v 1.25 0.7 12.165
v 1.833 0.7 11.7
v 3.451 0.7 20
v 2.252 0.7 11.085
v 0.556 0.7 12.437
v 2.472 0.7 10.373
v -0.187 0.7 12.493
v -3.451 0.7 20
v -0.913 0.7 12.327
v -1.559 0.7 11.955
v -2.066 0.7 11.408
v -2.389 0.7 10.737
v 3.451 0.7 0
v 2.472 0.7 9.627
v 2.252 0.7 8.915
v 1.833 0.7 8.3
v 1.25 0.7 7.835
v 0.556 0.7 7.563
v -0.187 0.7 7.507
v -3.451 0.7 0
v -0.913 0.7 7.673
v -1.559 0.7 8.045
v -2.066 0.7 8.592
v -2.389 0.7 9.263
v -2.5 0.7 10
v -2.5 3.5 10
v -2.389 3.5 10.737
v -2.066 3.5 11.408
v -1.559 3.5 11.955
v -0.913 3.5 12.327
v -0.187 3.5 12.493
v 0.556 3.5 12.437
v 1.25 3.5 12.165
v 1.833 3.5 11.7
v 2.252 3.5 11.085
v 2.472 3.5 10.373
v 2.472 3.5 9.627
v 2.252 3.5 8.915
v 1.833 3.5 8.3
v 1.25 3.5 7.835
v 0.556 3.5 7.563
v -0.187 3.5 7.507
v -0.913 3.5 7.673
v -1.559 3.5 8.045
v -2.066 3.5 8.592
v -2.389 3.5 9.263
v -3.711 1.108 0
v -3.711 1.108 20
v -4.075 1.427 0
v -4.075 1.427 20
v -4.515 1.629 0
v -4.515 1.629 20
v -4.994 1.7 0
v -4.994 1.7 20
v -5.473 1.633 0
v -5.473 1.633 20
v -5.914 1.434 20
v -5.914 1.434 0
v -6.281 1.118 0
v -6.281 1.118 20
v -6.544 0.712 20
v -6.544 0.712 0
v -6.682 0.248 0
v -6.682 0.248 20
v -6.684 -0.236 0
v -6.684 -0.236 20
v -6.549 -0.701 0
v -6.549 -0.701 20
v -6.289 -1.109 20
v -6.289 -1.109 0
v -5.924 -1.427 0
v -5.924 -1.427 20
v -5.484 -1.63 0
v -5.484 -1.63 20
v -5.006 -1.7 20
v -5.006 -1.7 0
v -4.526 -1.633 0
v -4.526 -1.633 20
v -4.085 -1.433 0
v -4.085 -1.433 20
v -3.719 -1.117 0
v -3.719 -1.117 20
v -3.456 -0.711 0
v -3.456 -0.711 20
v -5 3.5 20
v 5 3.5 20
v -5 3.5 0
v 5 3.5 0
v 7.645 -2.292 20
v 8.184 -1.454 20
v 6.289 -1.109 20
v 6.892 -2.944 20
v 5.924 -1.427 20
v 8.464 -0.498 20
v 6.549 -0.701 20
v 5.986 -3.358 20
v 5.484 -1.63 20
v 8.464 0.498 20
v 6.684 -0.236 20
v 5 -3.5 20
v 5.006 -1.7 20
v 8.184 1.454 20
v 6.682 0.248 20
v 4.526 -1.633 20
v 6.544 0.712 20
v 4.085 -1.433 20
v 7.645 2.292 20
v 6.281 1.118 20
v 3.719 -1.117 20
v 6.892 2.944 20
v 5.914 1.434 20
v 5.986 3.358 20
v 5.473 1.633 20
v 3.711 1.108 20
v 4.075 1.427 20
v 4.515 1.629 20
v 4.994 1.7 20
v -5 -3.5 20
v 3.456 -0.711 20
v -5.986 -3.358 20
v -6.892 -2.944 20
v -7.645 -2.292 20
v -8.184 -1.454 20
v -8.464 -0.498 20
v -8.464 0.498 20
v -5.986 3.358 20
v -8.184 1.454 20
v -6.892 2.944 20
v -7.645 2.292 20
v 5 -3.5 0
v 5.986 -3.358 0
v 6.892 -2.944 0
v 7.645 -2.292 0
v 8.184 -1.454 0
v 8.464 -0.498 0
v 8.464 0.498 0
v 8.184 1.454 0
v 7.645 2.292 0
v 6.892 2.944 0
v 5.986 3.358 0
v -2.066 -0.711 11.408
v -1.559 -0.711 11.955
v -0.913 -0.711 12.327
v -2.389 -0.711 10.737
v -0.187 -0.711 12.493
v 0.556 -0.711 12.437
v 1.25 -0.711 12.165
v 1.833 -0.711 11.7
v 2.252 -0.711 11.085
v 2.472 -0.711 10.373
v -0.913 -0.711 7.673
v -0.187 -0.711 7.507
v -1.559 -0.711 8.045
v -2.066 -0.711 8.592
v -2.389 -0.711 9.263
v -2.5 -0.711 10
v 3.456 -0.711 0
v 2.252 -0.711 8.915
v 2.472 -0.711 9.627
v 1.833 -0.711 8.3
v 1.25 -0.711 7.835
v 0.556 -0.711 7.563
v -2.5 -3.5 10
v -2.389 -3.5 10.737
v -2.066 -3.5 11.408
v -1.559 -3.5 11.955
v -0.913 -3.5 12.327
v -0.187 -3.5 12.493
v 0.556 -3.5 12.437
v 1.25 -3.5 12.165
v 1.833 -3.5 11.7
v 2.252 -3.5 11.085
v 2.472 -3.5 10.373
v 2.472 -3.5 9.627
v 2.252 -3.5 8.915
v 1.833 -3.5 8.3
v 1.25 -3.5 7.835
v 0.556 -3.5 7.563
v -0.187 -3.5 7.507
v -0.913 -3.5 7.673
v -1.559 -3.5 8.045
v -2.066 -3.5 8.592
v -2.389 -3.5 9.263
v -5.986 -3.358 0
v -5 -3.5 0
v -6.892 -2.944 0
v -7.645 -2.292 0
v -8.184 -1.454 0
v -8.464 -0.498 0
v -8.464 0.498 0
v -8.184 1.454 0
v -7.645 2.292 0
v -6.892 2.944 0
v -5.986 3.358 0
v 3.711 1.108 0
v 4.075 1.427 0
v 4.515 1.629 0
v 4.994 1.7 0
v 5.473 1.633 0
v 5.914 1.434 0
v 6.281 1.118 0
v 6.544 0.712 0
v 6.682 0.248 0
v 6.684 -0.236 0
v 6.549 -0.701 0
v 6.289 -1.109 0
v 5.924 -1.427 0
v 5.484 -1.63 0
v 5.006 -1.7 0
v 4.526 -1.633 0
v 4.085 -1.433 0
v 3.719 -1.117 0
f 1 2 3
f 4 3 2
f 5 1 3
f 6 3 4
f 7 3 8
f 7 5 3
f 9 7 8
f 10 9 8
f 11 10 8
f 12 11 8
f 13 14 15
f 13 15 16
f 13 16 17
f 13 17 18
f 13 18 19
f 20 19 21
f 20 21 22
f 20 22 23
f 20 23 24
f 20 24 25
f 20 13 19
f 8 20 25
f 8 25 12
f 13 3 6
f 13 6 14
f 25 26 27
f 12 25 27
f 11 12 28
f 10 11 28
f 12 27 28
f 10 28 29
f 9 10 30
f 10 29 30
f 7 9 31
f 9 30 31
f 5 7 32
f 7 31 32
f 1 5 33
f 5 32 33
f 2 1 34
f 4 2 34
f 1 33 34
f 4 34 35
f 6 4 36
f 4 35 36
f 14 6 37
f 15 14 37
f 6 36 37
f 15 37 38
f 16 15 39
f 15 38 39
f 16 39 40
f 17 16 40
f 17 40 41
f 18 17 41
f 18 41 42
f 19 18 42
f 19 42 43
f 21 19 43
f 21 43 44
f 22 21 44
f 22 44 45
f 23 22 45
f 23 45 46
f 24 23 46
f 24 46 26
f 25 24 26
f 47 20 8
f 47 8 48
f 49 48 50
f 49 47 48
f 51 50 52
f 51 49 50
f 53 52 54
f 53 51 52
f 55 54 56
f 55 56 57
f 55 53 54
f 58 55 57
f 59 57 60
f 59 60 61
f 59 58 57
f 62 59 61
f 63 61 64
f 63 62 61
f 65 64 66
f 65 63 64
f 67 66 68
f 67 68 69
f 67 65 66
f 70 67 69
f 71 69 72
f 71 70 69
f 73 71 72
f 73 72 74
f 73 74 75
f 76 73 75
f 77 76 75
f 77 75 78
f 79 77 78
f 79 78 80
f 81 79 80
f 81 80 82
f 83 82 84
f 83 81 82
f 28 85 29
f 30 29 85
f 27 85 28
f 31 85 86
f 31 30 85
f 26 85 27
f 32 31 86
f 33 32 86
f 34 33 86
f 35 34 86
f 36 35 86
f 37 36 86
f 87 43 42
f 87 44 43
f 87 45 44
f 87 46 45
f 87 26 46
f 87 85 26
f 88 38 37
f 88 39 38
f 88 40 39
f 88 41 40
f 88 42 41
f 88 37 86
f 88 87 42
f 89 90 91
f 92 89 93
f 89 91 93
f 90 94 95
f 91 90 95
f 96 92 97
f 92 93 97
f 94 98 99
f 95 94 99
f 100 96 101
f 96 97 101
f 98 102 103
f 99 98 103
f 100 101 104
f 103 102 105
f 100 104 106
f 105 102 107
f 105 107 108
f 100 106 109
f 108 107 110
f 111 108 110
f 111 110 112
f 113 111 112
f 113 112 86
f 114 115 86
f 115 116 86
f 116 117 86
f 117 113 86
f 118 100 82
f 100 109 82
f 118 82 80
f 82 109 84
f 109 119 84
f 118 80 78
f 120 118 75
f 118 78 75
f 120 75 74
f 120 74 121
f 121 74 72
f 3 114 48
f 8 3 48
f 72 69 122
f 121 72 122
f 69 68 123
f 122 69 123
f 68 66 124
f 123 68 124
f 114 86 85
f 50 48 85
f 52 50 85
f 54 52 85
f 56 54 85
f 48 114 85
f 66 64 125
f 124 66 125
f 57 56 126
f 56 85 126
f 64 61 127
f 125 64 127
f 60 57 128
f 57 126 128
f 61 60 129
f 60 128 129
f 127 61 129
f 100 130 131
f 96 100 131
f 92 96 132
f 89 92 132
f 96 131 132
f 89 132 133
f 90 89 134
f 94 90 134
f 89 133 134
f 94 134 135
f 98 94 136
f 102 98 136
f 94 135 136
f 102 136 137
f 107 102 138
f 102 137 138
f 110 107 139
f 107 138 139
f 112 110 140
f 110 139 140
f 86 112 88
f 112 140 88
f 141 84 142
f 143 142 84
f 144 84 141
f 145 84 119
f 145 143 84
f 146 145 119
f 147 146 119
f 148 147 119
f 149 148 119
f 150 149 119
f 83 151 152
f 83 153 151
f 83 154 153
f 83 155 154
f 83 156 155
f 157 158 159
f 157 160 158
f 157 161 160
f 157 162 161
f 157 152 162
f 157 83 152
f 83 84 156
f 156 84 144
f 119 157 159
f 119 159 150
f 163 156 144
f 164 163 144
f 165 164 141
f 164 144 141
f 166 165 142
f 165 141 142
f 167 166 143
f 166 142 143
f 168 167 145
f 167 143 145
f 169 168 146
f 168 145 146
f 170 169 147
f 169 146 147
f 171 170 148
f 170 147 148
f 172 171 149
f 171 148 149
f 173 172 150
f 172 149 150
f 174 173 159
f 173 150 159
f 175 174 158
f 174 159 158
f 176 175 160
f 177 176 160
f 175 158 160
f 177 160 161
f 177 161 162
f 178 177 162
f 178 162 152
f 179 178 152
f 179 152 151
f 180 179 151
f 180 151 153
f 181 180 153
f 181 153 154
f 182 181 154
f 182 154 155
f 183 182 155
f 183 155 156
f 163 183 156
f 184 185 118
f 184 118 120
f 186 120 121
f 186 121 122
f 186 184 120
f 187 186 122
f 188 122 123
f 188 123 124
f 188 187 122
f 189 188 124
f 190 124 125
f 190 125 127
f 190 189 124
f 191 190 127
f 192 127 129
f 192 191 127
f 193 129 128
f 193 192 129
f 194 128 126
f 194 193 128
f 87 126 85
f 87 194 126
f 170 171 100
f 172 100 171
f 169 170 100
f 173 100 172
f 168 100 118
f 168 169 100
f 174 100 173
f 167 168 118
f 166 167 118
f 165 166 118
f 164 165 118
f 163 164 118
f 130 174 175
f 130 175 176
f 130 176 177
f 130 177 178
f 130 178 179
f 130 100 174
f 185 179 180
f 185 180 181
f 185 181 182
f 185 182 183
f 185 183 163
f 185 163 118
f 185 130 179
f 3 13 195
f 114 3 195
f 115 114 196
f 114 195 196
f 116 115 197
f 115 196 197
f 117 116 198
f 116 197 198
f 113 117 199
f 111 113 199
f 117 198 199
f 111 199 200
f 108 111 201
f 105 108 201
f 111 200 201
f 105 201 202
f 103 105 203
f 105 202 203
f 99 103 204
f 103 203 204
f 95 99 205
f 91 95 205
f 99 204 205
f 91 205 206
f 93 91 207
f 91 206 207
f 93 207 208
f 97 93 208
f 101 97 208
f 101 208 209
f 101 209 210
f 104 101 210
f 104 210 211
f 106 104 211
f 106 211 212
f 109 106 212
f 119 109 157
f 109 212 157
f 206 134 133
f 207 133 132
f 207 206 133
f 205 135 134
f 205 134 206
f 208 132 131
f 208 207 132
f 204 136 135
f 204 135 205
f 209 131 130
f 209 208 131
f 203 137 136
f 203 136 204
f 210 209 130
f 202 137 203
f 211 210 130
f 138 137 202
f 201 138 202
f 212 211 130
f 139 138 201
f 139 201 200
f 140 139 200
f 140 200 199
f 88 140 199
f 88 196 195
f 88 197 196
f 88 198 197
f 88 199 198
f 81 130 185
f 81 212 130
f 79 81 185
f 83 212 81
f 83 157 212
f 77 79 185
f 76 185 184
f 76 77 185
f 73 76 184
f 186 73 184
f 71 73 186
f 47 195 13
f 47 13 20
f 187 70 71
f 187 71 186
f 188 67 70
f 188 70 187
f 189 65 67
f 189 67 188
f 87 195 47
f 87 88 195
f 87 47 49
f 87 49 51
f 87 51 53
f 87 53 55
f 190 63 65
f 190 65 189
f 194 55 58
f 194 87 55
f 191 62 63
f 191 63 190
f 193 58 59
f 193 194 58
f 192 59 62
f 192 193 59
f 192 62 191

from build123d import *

# Parameters (mm, degrees)
F1_DEPTH = 20
F3_R     = 2.5
F4_DEPTH = 7.001


with BuildPart() as f1:
    # F0 (on Top) → F1 (new body)
    with BuildSketch(Plane.XY):
        with BuildLine():
            ThreePointArc((3.450807, 0.7), (6.699989, 0.006025), (3.455807, -0.710963))
            Line((3.455807, -0.710963), (0, -0.710963))
            Line((0, -0.710963), (0, -3.5))
            Line((0, -3.5), (5, -3.5))
            ThreePointArc((5, -3.5), (8.5, 0), (5, 3.5))
            Line((5, 3.5), (0, 3.5))
            Line((0, 3.5), (0, 0.7))
            Line((0, 0.7), (3.450807, 0.7))
        make_face()
    extrude(amount=F1_DEPTH)

    # F2: F1 across plane


with BuildPart() as f1_1:
    add(f1.part)
    add(f1.part.mirror(Plane.YZ))

    # F3 (on face) → F4 (cut, through all)
    with BuildSketch(Plane(origin=(0, 3.5, 0), x_dir=(-1, 0, 0), z_dir=(0, 1, 0))):
        with Locations((0, 10)):
            Circle(F3_R)
    extrude(amount=-F4_DEPTH, mode=Mode.SUBTRACT)


solid = f1_1.part
